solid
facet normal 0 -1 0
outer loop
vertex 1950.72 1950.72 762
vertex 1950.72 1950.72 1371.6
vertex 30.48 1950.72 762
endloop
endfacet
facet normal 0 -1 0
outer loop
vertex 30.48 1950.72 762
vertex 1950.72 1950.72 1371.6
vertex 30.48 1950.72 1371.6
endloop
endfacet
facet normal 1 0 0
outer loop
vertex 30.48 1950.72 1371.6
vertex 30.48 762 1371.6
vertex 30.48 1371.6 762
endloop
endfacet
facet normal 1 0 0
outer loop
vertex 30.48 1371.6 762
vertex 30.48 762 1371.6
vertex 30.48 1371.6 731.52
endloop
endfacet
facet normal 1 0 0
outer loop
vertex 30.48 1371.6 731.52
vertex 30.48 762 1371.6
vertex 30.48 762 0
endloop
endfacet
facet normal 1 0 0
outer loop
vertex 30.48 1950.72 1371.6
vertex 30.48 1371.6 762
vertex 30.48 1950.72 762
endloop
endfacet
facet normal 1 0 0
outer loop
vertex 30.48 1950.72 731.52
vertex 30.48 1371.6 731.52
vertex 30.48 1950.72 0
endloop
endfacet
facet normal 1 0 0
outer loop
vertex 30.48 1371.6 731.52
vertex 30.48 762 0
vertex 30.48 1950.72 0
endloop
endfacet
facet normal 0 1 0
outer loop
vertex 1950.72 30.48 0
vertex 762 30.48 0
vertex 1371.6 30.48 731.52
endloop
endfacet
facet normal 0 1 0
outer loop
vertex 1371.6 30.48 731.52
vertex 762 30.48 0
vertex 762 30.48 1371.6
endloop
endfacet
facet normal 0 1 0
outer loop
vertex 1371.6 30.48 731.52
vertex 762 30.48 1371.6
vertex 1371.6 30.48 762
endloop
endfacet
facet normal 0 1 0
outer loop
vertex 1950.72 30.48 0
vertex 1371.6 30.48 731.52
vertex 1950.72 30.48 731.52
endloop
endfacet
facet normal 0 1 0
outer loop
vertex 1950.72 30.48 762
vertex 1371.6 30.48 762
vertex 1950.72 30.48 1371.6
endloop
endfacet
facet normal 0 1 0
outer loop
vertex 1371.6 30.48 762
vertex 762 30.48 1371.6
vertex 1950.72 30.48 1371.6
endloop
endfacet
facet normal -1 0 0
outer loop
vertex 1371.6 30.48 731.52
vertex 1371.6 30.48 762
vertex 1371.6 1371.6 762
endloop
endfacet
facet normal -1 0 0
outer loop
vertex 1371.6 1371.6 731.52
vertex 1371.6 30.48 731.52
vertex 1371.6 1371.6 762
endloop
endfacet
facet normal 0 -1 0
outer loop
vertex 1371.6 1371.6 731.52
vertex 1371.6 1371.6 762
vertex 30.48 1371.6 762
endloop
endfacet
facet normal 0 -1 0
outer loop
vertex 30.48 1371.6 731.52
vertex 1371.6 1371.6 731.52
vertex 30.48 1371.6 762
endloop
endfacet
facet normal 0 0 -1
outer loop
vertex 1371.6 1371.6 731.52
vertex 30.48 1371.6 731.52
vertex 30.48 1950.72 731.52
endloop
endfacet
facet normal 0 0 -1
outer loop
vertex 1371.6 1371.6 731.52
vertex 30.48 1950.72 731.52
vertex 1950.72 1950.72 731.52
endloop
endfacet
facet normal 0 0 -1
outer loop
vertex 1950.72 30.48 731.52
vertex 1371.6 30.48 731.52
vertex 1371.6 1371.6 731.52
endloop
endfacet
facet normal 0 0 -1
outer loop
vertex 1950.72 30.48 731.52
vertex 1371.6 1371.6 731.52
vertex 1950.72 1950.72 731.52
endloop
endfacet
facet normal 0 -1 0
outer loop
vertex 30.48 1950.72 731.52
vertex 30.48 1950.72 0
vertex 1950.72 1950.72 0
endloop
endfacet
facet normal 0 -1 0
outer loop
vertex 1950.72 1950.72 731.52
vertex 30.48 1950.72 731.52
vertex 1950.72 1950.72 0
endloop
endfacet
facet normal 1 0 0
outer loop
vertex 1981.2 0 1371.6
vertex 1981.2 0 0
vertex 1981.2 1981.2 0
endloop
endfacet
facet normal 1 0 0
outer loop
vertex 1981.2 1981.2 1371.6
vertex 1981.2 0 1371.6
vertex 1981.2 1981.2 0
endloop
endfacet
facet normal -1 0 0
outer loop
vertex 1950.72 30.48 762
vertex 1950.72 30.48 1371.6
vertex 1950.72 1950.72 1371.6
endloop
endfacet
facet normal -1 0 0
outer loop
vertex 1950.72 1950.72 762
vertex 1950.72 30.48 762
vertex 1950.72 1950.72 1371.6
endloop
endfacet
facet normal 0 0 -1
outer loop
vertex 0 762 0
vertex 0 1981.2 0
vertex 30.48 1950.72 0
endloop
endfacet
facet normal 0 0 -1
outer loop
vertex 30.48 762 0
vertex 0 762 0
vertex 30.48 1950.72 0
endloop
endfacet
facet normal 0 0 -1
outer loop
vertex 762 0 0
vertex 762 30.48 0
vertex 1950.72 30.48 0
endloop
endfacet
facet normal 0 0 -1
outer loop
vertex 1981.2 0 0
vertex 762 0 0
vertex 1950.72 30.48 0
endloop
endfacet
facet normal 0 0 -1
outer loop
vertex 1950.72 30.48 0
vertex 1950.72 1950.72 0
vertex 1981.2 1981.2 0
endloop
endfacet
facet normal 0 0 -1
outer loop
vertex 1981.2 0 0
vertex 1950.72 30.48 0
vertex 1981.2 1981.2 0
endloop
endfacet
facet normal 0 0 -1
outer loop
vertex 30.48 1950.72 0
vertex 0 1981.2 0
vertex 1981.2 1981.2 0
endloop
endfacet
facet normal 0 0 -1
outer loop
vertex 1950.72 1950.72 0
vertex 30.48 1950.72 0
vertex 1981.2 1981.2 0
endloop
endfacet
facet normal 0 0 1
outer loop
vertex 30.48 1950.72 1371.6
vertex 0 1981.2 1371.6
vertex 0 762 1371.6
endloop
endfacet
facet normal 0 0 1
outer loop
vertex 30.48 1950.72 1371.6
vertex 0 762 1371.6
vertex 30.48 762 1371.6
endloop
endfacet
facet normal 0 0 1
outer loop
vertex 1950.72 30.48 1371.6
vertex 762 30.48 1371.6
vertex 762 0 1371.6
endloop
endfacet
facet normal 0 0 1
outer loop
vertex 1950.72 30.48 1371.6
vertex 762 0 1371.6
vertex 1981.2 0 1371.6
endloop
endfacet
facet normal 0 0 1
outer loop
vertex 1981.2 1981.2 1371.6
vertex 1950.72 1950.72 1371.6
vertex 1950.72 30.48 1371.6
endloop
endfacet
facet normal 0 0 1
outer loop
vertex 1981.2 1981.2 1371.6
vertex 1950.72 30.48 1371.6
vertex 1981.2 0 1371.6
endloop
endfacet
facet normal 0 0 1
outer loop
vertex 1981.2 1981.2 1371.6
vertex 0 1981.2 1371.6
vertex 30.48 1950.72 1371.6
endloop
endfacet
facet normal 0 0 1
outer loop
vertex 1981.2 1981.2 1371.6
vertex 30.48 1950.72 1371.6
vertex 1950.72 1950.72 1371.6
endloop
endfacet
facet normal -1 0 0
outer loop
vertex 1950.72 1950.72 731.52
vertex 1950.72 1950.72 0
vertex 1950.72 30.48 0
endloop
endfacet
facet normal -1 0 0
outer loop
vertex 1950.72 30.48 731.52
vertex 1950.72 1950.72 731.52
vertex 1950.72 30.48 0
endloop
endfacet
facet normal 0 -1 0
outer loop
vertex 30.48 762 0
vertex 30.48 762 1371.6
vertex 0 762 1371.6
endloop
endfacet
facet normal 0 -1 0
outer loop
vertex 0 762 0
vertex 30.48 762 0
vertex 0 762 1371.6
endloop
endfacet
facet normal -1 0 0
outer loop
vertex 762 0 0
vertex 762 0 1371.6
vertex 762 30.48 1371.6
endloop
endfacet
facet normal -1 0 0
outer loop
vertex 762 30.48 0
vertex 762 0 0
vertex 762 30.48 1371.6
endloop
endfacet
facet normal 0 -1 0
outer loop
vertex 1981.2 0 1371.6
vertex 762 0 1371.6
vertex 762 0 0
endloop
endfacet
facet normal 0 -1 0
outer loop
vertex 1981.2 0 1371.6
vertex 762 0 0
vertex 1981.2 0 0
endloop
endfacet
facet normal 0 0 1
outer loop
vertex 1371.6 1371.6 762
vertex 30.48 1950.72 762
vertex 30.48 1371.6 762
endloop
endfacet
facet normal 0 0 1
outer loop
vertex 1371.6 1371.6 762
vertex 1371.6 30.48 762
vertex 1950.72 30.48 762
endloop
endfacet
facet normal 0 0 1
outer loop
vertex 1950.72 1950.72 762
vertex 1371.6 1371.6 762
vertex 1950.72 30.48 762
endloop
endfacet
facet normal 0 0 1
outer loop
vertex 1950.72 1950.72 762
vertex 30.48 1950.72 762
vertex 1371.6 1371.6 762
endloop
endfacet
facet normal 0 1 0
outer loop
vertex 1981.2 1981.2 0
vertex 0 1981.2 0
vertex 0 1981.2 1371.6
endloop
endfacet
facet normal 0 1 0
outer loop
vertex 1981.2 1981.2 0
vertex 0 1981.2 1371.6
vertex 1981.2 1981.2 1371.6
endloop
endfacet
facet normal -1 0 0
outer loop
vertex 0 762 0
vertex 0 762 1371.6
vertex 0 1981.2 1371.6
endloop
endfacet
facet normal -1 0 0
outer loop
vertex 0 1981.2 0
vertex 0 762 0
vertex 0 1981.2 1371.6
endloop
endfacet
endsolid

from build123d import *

# Parameters (mm, degrees)
F0_W     = 1981.2
F0_H     = 1981.2
F1_DEPTH = 1371.6
F3_DEPTH = 1524
F5_DEPTH = 609.6
F7_DEPTH = 731.52


with BuildPart() as f1:
    # F0 (on Top) → F1 (new body)
    with BuildSketch(Plane.XY):
        with Locations((990.6, 990.6)):
            Rectangle(F0_W, F0_H)
    extrude(amount=F1_DEPTH)

    # F2 (on face) → F3 (cut)
    with BuildSketch(Plane.XY.offset(1371.6)):
        Polygon((1371.6, 465.324644), (1371.6, 1371.6), (30.48, 1371.6), (30.48, 762), (0, 762), (0, 0), (762, 0), (762, 30.48), (1371.6, 30.48), align=None)
    extrude(amount=-F3_DEPTH, mode=Mode.SUBTRACT)

    # F4 (on face) → F5 (cut)
    with BuildSketch(Plane.XY.offset(1371.6)):
        Polygon((30.48, 1950.72), (30.48, 1371.6), (1371.6, 1371.6), (1371.6, 30.48), (1950.72, 30.48), (1950.72, 1950.72), align=None)
    extrude(amount=-F5_DEPTH, mode=Mode.SUBTRACT)

    # F6 (on face) → F7 (cut)
    with BuildSketch(Plane(origin=(0, 0, 0), x_dir=(1, 0, 0), z_dir=(0, 0, -1))):
        Polygon((1371.6, -1371.6), (30.48, -1371.6), (30.48, -1950.72), (1950.72, -1950.72), (1950.72, -30.48), (1371.6, -30.48), align=None)
    extrude(amount=-F7_DEPTH, mode=Mode.SUBTRACT)


solid = f1.part
